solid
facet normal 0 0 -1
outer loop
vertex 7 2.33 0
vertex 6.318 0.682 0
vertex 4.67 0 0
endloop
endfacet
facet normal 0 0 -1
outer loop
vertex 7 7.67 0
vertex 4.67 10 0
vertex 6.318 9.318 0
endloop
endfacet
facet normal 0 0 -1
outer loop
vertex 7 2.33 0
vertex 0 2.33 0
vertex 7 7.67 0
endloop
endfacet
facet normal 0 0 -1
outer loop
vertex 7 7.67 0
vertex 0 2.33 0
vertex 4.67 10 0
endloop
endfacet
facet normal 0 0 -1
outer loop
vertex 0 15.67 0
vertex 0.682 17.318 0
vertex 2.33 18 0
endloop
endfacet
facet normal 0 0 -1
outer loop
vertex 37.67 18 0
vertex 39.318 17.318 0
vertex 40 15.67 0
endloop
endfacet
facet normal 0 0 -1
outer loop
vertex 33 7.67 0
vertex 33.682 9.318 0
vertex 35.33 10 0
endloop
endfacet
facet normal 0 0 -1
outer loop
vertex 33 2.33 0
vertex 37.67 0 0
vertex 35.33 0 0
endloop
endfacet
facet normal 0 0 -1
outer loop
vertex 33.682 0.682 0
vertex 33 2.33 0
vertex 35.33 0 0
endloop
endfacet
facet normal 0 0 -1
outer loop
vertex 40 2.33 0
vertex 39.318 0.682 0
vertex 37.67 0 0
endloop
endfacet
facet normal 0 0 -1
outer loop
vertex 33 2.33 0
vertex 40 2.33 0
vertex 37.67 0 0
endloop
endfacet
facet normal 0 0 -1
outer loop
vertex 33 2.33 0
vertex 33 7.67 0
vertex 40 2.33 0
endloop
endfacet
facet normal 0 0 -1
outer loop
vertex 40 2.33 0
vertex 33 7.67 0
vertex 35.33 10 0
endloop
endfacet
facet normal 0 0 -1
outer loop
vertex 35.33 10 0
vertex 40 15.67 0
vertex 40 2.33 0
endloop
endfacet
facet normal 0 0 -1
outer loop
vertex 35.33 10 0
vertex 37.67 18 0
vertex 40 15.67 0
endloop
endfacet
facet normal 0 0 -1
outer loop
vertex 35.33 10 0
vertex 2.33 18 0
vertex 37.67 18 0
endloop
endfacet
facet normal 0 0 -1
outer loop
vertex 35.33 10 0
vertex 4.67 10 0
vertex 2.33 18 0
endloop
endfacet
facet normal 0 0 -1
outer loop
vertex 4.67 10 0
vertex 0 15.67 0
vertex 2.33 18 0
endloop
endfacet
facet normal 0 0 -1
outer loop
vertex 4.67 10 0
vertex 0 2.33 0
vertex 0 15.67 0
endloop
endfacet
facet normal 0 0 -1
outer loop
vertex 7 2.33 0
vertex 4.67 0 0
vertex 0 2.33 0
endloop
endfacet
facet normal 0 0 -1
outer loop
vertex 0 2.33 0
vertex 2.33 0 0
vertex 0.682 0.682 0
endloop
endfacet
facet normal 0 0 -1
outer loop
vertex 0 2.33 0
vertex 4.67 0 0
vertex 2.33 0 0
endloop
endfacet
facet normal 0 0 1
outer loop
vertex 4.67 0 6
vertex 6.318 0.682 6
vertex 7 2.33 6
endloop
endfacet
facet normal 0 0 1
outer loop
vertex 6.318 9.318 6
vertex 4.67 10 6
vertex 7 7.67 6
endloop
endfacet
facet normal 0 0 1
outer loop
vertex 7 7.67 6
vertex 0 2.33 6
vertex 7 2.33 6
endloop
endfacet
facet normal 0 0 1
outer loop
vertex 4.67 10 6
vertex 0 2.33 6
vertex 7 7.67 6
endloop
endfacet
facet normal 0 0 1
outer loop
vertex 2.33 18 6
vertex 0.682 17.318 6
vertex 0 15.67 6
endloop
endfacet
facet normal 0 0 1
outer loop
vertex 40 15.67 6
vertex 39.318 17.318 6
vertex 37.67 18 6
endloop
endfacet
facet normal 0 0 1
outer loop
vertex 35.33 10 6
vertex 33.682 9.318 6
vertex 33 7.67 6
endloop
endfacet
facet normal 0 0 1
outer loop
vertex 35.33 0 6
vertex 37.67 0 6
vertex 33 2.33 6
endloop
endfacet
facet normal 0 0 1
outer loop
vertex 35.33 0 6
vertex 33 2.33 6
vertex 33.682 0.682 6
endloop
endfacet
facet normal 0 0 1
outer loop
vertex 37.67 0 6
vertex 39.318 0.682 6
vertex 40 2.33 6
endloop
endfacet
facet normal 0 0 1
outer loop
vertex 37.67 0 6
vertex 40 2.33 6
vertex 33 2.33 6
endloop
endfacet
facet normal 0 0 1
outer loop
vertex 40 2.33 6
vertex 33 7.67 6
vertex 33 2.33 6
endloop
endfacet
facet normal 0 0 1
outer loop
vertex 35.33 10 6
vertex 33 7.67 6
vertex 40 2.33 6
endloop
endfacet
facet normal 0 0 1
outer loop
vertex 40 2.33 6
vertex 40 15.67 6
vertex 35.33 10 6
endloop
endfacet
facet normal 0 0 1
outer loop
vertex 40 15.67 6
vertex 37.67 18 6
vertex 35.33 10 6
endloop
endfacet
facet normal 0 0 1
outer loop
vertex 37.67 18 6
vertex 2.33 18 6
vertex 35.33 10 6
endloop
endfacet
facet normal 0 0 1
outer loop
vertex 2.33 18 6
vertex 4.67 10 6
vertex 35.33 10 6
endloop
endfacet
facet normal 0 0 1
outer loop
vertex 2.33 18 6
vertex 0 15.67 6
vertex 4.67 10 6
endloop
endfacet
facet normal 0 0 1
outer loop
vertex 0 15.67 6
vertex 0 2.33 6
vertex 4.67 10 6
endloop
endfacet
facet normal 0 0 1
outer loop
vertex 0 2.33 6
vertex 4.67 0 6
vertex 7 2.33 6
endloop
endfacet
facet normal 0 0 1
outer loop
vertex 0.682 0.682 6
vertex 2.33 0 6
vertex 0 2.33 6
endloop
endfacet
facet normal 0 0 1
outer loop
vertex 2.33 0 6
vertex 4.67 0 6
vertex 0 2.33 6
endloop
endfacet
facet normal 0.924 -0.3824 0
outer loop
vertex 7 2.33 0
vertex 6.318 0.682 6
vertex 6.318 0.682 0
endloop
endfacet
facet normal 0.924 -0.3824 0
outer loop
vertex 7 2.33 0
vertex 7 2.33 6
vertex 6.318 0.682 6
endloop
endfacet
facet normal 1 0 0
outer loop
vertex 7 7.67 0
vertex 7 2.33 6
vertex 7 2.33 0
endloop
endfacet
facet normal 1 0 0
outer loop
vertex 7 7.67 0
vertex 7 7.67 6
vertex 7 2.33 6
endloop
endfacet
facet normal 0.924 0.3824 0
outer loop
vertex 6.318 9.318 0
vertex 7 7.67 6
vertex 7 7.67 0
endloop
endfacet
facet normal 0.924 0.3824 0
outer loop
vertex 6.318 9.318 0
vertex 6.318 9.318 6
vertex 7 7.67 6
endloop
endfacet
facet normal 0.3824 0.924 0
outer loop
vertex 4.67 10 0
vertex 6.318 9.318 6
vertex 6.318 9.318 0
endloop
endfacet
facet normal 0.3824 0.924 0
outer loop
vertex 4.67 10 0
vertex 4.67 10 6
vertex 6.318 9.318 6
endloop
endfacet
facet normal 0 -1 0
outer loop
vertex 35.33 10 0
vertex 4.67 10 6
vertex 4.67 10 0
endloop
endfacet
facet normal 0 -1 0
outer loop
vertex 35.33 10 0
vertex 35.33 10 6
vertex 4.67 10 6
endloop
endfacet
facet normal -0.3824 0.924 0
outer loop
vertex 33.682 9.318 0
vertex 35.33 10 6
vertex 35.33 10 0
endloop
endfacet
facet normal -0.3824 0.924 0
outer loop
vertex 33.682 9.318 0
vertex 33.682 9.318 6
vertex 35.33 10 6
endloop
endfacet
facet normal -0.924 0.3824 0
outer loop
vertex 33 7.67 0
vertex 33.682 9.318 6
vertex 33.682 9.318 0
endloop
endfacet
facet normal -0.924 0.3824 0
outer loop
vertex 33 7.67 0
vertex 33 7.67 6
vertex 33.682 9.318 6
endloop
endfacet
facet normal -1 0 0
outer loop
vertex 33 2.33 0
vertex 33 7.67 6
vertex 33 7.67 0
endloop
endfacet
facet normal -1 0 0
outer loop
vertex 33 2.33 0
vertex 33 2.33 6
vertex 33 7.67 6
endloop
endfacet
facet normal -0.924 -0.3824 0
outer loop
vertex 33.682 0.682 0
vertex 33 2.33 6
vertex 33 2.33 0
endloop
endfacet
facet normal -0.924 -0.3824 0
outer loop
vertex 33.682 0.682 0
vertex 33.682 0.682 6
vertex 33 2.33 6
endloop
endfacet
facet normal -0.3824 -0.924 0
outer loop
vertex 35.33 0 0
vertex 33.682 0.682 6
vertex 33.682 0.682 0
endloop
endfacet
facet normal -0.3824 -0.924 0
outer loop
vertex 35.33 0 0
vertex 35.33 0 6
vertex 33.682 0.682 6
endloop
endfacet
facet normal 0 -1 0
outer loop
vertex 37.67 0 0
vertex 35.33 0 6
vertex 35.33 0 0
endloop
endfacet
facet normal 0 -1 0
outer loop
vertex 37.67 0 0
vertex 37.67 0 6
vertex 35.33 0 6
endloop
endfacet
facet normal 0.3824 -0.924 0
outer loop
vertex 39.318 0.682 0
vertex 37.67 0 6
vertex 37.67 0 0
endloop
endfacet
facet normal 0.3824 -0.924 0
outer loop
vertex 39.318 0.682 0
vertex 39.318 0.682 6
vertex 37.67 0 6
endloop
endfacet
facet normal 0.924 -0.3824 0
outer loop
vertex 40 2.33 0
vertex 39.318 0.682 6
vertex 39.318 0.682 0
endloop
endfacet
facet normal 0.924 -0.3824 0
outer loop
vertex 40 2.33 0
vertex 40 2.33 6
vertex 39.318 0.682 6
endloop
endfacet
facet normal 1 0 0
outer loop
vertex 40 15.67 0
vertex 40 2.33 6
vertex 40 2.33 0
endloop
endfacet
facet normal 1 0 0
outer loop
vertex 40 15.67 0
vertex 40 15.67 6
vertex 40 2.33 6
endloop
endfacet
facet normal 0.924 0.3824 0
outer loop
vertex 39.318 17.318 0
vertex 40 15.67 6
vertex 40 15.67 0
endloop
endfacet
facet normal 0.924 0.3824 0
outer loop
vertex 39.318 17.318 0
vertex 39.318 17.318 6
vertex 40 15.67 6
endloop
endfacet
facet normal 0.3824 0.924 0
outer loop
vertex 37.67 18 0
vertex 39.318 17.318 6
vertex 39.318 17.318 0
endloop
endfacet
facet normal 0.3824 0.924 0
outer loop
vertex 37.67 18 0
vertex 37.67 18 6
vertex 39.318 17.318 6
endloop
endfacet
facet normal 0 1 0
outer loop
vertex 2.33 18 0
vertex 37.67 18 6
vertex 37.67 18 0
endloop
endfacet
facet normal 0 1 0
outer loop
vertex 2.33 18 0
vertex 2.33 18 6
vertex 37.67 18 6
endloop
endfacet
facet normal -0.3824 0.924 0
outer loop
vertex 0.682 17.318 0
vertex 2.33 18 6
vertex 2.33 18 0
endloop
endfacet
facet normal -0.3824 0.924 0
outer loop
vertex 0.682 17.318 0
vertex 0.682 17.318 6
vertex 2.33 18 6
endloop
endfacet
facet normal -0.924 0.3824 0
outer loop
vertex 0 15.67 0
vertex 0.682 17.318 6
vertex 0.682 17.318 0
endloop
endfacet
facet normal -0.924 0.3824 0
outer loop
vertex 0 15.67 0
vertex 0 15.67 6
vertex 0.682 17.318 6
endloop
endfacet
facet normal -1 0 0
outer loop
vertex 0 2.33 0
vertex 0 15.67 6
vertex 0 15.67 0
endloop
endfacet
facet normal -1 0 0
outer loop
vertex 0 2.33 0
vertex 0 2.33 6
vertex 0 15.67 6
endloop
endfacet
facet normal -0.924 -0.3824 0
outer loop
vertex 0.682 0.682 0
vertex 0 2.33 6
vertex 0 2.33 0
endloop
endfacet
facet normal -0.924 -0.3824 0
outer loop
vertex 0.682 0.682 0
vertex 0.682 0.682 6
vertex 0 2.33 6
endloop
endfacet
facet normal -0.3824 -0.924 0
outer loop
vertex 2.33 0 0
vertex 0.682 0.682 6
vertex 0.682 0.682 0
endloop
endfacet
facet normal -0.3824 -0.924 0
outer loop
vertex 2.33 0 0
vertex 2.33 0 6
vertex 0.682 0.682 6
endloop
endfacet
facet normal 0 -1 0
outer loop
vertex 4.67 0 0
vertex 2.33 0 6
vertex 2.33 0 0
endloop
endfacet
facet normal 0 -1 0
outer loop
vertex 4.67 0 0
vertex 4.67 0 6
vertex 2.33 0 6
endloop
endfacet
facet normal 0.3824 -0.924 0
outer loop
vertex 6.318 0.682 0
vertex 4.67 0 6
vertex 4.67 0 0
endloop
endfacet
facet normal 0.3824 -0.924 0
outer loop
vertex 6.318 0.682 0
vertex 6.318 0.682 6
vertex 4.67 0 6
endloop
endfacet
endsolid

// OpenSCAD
$fn = 32;

// ----------------------------------------------------------------------
// Clip blank: staple clip, 6 mm thick
// ----------------------------------------------------------------------

// --- parameters (mm) ---
profile_height = 6;       // extrusion height
profile_points = 24;      // points of the closed outline

profile = [[0, 2.33], [0.682, 0.682], [2.33, 0], [4.67, 0], [6.318, 0.682], [7, 2.33], [7, 7.67], [6.318, 9.318], [4.67, 10], [35.33, 10], [33.682, 9.318], [33, 7.67], [33, 2.33], [33.682, 0.682], [35.33, 0], [37.67, 0], [39.318, 0.682], [40, 2.33], [40, 15.67], [39.318, 17.318], [37.67, 18], [2.33, 18], [0.682, 17.318], [0, 15.67]];  // single closed polygon, 24 points, counter clockwise

// --- the one profile operation ---
linear_extrude(height = profile_height) polygon(points = profile);
